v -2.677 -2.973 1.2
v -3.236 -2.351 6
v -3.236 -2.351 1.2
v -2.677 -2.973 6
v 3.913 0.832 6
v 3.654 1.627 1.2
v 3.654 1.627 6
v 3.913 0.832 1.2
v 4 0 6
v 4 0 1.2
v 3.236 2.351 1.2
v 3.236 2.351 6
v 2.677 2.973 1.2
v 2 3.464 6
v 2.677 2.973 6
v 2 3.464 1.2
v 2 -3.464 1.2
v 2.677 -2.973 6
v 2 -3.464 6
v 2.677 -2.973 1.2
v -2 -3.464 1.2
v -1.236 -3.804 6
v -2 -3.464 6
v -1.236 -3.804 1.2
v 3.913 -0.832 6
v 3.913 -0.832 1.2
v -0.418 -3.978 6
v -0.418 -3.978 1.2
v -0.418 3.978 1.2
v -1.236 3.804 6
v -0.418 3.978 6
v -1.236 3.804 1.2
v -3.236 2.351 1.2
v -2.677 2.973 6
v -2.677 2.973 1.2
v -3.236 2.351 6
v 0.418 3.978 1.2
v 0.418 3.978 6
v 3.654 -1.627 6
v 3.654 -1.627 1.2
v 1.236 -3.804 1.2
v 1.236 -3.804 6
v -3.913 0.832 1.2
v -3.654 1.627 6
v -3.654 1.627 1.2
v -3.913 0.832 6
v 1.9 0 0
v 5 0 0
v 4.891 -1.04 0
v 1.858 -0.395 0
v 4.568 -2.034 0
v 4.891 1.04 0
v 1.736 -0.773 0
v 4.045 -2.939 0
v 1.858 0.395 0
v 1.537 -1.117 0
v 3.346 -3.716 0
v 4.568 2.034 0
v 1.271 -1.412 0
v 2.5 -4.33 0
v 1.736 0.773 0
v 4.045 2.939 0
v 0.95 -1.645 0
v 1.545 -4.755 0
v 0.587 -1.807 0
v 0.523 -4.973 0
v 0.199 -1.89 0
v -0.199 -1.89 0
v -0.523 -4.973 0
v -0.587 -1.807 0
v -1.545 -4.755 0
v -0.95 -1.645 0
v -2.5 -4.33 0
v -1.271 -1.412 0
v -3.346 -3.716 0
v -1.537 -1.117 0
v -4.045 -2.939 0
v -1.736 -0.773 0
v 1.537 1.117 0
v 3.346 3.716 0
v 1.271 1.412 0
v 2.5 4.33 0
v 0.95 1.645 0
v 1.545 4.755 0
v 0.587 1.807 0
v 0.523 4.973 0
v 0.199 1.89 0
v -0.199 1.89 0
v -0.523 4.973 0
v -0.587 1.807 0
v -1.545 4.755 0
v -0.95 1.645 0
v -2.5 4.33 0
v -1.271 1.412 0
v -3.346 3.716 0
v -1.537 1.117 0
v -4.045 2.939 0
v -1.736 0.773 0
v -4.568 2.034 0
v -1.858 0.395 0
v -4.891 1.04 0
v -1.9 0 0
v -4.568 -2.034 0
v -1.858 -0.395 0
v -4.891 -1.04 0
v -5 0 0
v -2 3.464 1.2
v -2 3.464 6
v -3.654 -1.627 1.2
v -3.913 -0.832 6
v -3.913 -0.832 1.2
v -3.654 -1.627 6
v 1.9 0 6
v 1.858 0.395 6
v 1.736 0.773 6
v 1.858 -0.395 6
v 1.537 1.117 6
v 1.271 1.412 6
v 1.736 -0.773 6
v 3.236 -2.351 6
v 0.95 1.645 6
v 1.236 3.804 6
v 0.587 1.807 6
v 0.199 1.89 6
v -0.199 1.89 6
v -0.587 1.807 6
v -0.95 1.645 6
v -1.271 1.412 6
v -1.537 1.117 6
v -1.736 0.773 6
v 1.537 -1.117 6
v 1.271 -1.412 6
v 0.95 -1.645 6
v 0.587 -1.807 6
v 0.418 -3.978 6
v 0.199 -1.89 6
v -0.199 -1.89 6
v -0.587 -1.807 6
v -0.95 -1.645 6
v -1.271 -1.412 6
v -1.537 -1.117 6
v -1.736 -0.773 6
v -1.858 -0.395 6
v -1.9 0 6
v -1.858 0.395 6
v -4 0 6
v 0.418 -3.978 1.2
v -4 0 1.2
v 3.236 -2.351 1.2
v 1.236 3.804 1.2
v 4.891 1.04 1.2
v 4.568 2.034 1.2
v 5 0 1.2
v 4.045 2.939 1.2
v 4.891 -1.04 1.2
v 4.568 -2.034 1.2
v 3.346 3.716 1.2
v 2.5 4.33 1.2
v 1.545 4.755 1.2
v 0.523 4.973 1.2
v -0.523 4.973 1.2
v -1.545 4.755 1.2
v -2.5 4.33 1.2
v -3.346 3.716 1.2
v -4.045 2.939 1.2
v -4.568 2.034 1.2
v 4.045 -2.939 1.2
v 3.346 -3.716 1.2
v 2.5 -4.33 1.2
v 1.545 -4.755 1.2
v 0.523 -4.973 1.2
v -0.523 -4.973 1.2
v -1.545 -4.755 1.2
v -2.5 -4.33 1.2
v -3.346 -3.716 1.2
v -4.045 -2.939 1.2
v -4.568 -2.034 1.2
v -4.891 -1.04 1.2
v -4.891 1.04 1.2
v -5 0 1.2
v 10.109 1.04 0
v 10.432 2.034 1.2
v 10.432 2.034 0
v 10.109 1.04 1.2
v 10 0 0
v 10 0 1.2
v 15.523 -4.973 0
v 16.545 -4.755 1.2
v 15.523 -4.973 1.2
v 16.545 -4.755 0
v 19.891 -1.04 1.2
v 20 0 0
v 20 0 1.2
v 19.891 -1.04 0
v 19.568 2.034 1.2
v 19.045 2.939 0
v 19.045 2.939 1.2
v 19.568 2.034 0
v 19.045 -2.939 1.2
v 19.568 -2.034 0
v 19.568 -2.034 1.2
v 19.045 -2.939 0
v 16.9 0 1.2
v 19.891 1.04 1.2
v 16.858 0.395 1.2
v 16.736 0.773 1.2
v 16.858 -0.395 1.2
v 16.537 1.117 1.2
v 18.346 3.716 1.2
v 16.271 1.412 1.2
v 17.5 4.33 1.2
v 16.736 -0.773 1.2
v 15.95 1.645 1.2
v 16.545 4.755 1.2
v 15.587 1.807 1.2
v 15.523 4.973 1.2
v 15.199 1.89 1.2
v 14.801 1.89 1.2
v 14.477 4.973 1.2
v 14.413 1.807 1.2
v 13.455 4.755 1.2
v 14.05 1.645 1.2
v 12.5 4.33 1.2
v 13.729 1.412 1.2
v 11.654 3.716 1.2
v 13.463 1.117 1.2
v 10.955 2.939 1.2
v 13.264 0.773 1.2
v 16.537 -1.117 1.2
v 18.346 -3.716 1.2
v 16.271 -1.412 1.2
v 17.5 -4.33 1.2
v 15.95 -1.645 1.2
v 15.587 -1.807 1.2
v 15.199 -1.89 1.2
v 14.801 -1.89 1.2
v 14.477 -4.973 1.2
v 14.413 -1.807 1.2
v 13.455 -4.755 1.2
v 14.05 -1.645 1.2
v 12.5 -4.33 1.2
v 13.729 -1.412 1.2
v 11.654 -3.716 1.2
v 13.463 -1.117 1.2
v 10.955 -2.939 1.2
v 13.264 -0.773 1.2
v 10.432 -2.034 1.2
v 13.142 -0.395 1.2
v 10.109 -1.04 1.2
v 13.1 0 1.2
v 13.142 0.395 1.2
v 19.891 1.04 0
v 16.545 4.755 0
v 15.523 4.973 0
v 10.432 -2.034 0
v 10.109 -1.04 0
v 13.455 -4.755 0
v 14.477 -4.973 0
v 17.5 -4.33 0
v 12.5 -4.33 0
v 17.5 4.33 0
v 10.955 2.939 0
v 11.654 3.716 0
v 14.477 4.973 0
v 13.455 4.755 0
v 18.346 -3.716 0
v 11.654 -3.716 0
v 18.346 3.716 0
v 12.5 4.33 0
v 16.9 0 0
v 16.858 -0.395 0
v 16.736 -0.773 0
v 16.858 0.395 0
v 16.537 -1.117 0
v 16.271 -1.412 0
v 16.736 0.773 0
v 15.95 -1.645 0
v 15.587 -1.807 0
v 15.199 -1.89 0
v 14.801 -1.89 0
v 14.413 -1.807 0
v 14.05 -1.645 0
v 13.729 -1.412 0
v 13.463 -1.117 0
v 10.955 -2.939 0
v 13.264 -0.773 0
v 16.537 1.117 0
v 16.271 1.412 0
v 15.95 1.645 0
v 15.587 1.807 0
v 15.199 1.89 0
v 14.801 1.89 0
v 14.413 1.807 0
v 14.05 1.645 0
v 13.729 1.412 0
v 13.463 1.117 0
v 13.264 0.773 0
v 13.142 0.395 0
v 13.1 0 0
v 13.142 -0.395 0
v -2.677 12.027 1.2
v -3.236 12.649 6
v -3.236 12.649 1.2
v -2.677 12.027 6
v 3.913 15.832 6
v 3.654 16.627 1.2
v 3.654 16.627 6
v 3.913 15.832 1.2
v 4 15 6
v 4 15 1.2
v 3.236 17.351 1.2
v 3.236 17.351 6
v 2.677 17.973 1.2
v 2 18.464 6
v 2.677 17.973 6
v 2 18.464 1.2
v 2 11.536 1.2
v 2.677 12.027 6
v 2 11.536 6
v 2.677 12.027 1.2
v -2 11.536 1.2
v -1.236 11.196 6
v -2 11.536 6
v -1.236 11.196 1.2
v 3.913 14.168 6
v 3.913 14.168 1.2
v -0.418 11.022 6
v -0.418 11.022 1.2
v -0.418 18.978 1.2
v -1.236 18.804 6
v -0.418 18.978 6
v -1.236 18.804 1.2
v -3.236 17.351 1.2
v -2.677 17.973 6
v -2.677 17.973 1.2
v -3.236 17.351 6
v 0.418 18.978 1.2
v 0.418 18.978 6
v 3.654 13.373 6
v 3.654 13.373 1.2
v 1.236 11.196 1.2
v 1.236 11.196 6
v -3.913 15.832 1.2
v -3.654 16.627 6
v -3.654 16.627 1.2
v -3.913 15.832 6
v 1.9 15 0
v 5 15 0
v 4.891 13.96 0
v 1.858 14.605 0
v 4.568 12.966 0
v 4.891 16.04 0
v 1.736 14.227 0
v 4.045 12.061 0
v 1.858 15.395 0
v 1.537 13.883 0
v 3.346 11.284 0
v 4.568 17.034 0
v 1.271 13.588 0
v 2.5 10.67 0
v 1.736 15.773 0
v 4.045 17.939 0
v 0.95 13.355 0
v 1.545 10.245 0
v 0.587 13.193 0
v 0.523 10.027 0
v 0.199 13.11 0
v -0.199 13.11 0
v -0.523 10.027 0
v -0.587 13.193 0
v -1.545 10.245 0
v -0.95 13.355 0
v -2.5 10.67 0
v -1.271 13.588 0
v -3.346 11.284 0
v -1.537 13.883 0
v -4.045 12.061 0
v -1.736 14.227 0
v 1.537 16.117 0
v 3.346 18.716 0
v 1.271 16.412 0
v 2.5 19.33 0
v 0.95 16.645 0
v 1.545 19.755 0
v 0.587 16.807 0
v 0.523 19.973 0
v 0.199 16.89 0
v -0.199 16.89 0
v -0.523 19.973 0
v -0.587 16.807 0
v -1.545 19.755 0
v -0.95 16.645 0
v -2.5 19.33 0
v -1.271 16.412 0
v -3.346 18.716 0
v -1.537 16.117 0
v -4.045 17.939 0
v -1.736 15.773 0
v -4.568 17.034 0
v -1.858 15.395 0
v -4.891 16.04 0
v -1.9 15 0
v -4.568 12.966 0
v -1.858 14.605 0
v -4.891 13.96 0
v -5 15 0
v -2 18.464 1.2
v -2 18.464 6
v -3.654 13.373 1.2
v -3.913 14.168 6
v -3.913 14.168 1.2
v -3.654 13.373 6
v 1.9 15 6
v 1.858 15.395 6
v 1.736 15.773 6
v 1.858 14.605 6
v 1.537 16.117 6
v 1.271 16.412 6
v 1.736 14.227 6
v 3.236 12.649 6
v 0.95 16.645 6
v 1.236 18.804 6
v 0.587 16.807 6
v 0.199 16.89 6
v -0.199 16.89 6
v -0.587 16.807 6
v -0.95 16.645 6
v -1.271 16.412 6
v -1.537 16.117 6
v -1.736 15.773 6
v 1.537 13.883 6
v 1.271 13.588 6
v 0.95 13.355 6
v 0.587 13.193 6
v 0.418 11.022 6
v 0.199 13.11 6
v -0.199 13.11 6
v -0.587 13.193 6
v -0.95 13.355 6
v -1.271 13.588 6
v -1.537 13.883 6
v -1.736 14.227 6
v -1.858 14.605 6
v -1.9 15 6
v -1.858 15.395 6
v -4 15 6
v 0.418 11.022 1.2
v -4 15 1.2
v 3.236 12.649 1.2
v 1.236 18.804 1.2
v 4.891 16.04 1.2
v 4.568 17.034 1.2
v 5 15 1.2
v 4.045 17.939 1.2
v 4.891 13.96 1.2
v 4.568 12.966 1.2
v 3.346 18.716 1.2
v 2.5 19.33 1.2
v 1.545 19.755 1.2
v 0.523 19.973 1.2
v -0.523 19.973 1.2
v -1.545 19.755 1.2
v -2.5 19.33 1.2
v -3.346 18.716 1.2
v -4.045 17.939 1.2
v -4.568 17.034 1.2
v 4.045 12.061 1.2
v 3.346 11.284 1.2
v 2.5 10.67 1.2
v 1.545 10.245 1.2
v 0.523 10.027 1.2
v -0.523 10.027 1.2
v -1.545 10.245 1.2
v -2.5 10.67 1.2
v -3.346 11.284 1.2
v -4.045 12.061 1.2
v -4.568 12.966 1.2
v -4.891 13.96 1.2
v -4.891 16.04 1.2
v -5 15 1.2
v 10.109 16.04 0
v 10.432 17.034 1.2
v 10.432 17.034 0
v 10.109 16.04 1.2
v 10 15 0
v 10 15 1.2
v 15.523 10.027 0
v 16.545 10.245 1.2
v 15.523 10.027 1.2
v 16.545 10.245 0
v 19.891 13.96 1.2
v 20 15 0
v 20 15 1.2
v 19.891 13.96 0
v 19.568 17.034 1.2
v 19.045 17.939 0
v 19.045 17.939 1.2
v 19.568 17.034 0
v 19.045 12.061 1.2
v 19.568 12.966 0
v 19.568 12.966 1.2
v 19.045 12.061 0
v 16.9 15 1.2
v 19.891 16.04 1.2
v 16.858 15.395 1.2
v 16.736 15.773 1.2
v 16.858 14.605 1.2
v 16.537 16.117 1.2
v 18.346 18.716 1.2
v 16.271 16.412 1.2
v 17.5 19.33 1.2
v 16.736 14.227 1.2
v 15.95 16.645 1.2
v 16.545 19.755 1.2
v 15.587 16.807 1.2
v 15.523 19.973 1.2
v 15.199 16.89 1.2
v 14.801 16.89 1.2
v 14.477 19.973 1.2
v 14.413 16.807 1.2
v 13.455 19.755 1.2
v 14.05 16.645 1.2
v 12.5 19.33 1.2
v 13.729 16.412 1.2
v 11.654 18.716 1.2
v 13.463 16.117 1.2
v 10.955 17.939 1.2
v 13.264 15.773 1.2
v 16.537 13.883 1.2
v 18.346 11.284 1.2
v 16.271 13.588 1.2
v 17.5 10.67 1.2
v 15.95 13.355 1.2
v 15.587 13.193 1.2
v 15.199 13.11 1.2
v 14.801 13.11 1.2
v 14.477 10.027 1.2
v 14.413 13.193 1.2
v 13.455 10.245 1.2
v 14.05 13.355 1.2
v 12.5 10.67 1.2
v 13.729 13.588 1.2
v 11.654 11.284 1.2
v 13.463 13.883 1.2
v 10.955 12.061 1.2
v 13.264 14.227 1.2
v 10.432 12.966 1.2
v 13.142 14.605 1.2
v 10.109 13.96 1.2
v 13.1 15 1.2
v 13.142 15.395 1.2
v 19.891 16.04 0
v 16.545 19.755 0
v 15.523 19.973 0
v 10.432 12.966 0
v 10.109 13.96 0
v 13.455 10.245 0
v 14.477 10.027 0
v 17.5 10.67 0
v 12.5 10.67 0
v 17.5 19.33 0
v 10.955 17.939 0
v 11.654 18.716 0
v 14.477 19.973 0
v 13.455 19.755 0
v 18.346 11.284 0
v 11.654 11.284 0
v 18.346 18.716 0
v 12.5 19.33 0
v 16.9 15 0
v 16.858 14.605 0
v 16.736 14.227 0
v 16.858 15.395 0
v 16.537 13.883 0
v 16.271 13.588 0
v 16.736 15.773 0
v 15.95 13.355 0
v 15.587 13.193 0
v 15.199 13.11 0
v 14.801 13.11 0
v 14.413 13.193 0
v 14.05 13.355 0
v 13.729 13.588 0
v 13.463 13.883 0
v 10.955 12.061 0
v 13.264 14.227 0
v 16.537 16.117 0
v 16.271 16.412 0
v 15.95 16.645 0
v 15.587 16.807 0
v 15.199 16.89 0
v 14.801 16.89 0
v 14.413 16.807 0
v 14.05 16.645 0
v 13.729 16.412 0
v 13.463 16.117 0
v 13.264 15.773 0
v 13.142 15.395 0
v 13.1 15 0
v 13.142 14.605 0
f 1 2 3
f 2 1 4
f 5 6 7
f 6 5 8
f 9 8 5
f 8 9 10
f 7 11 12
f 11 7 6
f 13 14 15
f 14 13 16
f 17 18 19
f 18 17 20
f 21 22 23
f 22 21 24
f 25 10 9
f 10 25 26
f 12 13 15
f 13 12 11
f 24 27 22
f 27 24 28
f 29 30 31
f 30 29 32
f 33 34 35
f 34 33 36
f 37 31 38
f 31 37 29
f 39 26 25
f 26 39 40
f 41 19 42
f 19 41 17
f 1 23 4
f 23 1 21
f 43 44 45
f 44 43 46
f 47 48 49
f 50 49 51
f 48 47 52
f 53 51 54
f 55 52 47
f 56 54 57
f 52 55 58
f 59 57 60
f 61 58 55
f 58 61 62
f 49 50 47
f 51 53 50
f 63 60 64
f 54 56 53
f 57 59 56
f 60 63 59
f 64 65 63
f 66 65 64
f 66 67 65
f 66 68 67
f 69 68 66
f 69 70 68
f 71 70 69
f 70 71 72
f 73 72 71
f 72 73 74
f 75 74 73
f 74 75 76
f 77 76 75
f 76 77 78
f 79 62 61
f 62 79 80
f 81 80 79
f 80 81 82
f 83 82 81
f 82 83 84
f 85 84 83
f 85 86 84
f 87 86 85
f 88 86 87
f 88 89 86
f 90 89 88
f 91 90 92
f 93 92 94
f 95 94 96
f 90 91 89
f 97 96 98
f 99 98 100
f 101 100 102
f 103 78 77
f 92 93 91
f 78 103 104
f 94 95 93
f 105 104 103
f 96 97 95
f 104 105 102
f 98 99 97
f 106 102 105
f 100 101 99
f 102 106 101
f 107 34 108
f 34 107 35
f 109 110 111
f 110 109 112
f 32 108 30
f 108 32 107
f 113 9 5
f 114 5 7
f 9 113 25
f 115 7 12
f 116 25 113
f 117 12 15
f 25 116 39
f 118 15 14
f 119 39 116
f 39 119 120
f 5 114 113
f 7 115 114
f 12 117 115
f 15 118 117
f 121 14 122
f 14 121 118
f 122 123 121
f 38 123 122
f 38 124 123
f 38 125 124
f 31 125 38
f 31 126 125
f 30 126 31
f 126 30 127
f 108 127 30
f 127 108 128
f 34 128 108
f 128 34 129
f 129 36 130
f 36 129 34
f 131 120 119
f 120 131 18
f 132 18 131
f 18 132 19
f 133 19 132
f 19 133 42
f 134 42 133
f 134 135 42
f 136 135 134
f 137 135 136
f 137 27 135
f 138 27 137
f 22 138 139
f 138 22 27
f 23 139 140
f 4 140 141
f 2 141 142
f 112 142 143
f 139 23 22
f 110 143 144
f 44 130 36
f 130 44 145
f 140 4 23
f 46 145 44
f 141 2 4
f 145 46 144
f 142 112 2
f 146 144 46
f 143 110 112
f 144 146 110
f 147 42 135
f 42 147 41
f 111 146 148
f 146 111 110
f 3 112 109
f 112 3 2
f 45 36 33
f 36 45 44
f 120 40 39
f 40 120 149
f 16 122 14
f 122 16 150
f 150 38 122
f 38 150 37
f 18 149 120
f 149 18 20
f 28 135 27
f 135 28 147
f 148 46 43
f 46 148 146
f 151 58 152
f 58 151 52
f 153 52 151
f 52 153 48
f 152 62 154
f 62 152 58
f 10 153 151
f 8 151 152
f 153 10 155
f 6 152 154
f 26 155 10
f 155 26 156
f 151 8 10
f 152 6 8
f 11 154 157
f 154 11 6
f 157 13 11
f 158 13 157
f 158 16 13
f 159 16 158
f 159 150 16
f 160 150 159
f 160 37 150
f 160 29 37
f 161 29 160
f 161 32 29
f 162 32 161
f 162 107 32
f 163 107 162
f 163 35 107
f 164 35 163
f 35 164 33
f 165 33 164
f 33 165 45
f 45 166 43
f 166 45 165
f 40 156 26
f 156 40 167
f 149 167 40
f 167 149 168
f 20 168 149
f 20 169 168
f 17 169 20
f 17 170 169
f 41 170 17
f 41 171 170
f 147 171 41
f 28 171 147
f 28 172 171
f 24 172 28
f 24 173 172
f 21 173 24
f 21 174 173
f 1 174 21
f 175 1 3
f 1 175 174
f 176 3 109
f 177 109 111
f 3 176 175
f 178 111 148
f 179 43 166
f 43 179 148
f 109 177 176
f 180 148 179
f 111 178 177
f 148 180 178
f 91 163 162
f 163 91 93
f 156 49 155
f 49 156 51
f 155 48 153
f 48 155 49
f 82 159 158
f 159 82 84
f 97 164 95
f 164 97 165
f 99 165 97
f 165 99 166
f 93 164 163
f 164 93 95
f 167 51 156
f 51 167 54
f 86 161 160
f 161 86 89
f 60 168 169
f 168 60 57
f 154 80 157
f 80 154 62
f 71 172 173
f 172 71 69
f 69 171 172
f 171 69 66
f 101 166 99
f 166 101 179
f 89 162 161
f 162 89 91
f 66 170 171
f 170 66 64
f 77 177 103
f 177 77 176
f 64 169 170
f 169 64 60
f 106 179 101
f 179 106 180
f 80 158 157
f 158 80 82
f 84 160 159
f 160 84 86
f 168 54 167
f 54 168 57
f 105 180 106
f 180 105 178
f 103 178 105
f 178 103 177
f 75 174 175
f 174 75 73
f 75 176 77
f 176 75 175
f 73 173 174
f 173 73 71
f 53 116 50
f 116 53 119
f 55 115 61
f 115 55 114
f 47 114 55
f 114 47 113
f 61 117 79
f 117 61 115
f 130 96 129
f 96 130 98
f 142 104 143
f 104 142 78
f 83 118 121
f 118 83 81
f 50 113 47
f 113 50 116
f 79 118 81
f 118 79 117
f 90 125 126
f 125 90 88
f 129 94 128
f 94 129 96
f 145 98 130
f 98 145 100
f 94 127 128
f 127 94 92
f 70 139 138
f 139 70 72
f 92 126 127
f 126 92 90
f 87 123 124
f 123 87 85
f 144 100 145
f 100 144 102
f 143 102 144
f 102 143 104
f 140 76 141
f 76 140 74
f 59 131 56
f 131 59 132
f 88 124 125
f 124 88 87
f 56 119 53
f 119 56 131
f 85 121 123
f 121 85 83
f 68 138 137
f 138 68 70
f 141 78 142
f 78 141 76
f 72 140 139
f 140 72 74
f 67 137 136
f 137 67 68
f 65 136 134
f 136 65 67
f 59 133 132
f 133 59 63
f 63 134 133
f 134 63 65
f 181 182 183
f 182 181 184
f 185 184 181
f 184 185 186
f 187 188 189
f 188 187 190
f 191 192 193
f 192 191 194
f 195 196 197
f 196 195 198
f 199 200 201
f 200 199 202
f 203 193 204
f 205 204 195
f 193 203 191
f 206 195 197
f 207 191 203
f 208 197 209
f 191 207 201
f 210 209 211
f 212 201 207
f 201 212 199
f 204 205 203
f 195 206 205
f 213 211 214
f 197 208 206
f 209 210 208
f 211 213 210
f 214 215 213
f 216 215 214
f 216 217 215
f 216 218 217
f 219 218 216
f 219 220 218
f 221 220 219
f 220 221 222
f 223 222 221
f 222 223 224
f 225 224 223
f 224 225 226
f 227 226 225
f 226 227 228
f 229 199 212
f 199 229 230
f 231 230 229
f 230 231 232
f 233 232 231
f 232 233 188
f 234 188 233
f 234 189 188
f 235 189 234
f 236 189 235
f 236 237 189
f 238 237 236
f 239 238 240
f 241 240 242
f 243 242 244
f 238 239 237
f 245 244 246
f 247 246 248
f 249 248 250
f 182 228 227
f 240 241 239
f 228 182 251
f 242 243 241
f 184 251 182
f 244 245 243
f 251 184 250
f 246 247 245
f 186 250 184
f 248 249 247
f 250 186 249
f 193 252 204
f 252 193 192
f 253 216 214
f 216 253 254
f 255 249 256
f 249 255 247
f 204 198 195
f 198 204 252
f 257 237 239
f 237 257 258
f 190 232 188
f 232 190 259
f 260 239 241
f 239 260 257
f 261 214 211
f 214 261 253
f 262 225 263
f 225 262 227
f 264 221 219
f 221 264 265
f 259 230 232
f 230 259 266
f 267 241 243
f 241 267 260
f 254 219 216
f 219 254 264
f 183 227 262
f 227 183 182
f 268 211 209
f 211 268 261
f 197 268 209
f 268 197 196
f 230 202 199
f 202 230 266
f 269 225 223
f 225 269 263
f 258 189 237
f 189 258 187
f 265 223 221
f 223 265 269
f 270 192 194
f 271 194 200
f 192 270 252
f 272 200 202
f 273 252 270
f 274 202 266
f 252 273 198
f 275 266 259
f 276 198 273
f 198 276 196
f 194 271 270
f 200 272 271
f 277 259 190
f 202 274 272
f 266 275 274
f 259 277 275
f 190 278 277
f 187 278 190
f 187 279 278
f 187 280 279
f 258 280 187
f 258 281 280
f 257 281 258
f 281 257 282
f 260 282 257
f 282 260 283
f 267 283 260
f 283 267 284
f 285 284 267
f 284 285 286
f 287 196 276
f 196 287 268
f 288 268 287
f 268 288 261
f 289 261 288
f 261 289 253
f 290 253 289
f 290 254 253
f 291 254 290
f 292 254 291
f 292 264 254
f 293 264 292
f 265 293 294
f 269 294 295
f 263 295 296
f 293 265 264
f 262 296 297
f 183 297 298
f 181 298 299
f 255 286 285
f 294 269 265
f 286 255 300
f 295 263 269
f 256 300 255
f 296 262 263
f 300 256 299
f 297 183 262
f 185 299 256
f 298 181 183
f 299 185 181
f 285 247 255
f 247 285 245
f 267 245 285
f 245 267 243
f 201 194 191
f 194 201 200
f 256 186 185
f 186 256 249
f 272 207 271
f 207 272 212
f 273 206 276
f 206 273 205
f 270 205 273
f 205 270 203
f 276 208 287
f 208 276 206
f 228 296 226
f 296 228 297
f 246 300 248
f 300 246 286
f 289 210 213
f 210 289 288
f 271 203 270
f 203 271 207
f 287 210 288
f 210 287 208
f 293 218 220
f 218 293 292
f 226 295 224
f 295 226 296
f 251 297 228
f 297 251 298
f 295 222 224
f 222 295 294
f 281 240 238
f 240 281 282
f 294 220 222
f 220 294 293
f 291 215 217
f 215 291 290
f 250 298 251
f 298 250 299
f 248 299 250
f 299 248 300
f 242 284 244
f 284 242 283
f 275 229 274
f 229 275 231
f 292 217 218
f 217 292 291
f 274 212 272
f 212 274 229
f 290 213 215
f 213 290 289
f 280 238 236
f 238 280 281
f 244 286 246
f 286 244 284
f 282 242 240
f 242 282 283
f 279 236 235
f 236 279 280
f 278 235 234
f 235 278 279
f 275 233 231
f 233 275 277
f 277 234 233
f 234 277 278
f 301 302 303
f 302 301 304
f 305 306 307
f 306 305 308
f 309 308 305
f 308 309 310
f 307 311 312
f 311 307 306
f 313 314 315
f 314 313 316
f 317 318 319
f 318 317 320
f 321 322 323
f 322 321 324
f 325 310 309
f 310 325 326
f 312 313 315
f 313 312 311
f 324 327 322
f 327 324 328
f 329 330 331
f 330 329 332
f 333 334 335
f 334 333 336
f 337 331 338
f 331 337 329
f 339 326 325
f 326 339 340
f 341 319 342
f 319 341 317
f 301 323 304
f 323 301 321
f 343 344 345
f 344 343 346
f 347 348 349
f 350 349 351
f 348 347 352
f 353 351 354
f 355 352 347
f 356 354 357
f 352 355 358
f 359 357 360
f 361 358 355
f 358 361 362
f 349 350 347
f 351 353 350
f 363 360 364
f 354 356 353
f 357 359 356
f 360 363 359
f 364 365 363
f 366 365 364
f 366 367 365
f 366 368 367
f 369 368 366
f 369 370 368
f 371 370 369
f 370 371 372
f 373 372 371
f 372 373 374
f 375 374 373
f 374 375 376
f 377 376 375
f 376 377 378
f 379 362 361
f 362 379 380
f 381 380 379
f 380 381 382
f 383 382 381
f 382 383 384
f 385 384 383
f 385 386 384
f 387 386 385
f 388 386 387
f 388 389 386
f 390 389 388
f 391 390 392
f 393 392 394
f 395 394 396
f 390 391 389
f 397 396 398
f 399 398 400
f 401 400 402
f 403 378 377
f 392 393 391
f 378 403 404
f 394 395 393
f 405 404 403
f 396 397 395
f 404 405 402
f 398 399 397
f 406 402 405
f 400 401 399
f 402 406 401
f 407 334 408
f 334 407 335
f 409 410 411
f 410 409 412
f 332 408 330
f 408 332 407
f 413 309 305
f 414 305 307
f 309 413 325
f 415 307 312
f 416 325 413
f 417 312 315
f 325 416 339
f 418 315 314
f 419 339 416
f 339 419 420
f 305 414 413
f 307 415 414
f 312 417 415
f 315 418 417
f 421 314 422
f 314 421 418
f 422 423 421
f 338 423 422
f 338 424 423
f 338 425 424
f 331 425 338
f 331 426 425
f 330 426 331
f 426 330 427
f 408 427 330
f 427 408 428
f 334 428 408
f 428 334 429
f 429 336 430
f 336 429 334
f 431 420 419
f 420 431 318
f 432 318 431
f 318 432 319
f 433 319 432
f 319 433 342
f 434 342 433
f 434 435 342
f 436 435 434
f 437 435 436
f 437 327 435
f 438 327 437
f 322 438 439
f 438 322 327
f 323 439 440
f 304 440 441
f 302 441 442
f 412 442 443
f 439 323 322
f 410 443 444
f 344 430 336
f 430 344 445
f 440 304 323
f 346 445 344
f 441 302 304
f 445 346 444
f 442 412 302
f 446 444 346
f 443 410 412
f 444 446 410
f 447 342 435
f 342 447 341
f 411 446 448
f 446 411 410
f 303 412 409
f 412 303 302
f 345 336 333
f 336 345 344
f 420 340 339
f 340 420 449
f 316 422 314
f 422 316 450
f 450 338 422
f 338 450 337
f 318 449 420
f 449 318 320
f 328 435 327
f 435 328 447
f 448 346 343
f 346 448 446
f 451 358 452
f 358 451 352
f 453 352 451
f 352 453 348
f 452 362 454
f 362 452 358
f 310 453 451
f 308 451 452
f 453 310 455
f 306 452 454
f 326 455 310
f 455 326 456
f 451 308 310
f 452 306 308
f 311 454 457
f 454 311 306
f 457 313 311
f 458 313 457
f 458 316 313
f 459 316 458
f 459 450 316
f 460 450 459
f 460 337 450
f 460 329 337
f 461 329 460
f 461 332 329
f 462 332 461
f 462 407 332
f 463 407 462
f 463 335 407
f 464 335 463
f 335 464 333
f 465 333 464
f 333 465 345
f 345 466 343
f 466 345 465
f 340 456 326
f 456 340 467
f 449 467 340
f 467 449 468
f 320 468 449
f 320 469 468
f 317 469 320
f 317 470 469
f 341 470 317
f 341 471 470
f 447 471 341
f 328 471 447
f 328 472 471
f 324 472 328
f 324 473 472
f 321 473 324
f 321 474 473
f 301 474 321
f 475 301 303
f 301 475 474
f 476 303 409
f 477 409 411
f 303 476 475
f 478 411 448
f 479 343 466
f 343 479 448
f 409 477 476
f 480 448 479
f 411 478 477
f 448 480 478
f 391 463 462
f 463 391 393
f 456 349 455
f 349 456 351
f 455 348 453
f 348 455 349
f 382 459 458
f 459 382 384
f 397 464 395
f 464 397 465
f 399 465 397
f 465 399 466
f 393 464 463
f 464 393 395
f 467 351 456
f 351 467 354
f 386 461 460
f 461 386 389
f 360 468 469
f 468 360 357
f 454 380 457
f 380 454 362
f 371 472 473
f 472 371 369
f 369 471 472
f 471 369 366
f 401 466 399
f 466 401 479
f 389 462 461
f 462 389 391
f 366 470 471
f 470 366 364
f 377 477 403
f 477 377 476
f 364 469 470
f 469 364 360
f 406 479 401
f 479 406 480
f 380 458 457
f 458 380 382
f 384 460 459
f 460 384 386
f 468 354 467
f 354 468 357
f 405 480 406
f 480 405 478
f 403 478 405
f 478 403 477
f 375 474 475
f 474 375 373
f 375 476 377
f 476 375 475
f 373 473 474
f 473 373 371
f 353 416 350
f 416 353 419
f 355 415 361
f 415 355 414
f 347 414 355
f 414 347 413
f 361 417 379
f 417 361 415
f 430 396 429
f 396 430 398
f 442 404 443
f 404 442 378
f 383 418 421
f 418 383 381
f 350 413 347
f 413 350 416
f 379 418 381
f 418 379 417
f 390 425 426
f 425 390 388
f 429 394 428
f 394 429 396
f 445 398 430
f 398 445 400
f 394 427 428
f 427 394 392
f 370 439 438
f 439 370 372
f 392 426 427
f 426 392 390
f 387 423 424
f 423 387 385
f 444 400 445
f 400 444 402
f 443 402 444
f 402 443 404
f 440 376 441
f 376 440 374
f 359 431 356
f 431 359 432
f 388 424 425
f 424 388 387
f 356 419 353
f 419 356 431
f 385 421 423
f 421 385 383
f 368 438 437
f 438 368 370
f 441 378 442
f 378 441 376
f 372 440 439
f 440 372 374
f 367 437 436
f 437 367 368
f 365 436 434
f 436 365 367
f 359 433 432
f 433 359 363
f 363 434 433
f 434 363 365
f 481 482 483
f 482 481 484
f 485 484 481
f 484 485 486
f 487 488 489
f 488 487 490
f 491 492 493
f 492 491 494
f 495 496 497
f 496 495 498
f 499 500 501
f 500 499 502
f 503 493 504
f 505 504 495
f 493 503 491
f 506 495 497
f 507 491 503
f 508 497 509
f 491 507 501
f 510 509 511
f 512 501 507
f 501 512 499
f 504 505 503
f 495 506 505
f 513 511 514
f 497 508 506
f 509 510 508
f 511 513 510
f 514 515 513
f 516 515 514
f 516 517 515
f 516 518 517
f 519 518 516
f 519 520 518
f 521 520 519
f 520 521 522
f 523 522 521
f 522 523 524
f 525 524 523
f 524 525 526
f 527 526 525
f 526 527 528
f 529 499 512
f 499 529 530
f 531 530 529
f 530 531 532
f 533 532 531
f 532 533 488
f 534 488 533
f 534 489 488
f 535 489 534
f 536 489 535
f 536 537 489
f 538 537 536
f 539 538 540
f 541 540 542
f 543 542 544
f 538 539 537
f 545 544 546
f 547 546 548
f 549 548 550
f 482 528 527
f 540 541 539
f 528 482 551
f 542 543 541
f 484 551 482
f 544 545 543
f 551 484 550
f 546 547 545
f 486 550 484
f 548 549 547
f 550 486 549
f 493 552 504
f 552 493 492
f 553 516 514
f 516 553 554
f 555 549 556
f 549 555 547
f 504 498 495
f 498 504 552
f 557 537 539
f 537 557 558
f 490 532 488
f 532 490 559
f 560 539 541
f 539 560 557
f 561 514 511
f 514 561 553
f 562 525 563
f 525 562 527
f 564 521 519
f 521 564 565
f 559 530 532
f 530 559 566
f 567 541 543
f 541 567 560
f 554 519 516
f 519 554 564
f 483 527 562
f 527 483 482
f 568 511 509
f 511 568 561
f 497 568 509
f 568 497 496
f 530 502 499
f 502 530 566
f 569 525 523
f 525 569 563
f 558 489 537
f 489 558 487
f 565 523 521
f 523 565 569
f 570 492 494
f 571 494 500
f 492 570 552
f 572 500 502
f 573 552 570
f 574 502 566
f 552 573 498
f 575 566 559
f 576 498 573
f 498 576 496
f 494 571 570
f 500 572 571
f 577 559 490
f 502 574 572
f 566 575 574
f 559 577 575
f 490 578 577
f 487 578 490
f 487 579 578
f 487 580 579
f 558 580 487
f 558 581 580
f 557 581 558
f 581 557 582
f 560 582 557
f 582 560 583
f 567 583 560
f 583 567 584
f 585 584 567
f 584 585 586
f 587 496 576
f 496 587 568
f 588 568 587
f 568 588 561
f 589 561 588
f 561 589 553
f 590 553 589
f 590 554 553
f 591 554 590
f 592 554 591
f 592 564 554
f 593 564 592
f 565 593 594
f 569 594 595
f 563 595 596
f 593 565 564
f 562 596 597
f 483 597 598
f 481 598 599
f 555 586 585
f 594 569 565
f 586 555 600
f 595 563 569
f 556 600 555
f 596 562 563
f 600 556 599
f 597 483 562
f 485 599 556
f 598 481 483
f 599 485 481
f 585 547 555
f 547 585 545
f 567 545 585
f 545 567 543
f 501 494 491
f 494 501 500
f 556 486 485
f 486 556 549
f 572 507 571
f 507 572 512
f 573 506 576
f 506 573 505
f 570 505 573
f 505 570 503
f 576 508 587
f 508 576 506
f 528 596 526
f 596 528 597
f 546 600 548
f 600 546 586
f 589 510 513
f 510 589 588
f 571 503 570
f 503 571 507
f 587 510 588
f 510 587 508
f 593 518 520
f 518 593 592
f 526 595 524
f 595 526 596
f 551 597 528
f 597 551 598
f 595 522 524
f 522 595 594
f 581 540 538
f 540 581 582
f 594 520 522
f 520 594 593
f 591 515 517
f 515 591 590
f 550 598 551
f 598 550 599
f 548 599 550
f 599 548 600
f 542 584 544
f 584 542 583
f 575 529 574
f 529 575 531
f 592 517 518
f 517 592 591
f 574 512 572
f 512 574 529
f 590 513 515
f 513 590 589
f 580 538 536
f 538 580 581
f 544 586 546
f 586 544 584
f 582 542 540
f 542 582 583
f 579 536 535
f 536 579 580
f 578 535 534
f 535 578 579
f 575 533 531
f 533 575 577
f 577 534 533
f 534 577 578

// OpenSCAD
module pulley()
{
	difference()
	{
	  union()
	  {
	    cylinder(h=6.0,r=4.0,$fs=0.1);
	
	    cylinder(h=1.2,r=5,$fs=0.1);
	  }
	  cylinder(h=6.1,r=1.9,$fs=0.1);
	}
	
	translate(v=[15,0,0])
	{
	  difference()
	  {
	    cylinder(h=1.2,r=5,$fs=0.1);
	
	    cylinder(h=1.2,r=1.9,$fs=0.1);
	  }
	}
}

pulley();

translate(v=[0,15,0])
  pulley();
